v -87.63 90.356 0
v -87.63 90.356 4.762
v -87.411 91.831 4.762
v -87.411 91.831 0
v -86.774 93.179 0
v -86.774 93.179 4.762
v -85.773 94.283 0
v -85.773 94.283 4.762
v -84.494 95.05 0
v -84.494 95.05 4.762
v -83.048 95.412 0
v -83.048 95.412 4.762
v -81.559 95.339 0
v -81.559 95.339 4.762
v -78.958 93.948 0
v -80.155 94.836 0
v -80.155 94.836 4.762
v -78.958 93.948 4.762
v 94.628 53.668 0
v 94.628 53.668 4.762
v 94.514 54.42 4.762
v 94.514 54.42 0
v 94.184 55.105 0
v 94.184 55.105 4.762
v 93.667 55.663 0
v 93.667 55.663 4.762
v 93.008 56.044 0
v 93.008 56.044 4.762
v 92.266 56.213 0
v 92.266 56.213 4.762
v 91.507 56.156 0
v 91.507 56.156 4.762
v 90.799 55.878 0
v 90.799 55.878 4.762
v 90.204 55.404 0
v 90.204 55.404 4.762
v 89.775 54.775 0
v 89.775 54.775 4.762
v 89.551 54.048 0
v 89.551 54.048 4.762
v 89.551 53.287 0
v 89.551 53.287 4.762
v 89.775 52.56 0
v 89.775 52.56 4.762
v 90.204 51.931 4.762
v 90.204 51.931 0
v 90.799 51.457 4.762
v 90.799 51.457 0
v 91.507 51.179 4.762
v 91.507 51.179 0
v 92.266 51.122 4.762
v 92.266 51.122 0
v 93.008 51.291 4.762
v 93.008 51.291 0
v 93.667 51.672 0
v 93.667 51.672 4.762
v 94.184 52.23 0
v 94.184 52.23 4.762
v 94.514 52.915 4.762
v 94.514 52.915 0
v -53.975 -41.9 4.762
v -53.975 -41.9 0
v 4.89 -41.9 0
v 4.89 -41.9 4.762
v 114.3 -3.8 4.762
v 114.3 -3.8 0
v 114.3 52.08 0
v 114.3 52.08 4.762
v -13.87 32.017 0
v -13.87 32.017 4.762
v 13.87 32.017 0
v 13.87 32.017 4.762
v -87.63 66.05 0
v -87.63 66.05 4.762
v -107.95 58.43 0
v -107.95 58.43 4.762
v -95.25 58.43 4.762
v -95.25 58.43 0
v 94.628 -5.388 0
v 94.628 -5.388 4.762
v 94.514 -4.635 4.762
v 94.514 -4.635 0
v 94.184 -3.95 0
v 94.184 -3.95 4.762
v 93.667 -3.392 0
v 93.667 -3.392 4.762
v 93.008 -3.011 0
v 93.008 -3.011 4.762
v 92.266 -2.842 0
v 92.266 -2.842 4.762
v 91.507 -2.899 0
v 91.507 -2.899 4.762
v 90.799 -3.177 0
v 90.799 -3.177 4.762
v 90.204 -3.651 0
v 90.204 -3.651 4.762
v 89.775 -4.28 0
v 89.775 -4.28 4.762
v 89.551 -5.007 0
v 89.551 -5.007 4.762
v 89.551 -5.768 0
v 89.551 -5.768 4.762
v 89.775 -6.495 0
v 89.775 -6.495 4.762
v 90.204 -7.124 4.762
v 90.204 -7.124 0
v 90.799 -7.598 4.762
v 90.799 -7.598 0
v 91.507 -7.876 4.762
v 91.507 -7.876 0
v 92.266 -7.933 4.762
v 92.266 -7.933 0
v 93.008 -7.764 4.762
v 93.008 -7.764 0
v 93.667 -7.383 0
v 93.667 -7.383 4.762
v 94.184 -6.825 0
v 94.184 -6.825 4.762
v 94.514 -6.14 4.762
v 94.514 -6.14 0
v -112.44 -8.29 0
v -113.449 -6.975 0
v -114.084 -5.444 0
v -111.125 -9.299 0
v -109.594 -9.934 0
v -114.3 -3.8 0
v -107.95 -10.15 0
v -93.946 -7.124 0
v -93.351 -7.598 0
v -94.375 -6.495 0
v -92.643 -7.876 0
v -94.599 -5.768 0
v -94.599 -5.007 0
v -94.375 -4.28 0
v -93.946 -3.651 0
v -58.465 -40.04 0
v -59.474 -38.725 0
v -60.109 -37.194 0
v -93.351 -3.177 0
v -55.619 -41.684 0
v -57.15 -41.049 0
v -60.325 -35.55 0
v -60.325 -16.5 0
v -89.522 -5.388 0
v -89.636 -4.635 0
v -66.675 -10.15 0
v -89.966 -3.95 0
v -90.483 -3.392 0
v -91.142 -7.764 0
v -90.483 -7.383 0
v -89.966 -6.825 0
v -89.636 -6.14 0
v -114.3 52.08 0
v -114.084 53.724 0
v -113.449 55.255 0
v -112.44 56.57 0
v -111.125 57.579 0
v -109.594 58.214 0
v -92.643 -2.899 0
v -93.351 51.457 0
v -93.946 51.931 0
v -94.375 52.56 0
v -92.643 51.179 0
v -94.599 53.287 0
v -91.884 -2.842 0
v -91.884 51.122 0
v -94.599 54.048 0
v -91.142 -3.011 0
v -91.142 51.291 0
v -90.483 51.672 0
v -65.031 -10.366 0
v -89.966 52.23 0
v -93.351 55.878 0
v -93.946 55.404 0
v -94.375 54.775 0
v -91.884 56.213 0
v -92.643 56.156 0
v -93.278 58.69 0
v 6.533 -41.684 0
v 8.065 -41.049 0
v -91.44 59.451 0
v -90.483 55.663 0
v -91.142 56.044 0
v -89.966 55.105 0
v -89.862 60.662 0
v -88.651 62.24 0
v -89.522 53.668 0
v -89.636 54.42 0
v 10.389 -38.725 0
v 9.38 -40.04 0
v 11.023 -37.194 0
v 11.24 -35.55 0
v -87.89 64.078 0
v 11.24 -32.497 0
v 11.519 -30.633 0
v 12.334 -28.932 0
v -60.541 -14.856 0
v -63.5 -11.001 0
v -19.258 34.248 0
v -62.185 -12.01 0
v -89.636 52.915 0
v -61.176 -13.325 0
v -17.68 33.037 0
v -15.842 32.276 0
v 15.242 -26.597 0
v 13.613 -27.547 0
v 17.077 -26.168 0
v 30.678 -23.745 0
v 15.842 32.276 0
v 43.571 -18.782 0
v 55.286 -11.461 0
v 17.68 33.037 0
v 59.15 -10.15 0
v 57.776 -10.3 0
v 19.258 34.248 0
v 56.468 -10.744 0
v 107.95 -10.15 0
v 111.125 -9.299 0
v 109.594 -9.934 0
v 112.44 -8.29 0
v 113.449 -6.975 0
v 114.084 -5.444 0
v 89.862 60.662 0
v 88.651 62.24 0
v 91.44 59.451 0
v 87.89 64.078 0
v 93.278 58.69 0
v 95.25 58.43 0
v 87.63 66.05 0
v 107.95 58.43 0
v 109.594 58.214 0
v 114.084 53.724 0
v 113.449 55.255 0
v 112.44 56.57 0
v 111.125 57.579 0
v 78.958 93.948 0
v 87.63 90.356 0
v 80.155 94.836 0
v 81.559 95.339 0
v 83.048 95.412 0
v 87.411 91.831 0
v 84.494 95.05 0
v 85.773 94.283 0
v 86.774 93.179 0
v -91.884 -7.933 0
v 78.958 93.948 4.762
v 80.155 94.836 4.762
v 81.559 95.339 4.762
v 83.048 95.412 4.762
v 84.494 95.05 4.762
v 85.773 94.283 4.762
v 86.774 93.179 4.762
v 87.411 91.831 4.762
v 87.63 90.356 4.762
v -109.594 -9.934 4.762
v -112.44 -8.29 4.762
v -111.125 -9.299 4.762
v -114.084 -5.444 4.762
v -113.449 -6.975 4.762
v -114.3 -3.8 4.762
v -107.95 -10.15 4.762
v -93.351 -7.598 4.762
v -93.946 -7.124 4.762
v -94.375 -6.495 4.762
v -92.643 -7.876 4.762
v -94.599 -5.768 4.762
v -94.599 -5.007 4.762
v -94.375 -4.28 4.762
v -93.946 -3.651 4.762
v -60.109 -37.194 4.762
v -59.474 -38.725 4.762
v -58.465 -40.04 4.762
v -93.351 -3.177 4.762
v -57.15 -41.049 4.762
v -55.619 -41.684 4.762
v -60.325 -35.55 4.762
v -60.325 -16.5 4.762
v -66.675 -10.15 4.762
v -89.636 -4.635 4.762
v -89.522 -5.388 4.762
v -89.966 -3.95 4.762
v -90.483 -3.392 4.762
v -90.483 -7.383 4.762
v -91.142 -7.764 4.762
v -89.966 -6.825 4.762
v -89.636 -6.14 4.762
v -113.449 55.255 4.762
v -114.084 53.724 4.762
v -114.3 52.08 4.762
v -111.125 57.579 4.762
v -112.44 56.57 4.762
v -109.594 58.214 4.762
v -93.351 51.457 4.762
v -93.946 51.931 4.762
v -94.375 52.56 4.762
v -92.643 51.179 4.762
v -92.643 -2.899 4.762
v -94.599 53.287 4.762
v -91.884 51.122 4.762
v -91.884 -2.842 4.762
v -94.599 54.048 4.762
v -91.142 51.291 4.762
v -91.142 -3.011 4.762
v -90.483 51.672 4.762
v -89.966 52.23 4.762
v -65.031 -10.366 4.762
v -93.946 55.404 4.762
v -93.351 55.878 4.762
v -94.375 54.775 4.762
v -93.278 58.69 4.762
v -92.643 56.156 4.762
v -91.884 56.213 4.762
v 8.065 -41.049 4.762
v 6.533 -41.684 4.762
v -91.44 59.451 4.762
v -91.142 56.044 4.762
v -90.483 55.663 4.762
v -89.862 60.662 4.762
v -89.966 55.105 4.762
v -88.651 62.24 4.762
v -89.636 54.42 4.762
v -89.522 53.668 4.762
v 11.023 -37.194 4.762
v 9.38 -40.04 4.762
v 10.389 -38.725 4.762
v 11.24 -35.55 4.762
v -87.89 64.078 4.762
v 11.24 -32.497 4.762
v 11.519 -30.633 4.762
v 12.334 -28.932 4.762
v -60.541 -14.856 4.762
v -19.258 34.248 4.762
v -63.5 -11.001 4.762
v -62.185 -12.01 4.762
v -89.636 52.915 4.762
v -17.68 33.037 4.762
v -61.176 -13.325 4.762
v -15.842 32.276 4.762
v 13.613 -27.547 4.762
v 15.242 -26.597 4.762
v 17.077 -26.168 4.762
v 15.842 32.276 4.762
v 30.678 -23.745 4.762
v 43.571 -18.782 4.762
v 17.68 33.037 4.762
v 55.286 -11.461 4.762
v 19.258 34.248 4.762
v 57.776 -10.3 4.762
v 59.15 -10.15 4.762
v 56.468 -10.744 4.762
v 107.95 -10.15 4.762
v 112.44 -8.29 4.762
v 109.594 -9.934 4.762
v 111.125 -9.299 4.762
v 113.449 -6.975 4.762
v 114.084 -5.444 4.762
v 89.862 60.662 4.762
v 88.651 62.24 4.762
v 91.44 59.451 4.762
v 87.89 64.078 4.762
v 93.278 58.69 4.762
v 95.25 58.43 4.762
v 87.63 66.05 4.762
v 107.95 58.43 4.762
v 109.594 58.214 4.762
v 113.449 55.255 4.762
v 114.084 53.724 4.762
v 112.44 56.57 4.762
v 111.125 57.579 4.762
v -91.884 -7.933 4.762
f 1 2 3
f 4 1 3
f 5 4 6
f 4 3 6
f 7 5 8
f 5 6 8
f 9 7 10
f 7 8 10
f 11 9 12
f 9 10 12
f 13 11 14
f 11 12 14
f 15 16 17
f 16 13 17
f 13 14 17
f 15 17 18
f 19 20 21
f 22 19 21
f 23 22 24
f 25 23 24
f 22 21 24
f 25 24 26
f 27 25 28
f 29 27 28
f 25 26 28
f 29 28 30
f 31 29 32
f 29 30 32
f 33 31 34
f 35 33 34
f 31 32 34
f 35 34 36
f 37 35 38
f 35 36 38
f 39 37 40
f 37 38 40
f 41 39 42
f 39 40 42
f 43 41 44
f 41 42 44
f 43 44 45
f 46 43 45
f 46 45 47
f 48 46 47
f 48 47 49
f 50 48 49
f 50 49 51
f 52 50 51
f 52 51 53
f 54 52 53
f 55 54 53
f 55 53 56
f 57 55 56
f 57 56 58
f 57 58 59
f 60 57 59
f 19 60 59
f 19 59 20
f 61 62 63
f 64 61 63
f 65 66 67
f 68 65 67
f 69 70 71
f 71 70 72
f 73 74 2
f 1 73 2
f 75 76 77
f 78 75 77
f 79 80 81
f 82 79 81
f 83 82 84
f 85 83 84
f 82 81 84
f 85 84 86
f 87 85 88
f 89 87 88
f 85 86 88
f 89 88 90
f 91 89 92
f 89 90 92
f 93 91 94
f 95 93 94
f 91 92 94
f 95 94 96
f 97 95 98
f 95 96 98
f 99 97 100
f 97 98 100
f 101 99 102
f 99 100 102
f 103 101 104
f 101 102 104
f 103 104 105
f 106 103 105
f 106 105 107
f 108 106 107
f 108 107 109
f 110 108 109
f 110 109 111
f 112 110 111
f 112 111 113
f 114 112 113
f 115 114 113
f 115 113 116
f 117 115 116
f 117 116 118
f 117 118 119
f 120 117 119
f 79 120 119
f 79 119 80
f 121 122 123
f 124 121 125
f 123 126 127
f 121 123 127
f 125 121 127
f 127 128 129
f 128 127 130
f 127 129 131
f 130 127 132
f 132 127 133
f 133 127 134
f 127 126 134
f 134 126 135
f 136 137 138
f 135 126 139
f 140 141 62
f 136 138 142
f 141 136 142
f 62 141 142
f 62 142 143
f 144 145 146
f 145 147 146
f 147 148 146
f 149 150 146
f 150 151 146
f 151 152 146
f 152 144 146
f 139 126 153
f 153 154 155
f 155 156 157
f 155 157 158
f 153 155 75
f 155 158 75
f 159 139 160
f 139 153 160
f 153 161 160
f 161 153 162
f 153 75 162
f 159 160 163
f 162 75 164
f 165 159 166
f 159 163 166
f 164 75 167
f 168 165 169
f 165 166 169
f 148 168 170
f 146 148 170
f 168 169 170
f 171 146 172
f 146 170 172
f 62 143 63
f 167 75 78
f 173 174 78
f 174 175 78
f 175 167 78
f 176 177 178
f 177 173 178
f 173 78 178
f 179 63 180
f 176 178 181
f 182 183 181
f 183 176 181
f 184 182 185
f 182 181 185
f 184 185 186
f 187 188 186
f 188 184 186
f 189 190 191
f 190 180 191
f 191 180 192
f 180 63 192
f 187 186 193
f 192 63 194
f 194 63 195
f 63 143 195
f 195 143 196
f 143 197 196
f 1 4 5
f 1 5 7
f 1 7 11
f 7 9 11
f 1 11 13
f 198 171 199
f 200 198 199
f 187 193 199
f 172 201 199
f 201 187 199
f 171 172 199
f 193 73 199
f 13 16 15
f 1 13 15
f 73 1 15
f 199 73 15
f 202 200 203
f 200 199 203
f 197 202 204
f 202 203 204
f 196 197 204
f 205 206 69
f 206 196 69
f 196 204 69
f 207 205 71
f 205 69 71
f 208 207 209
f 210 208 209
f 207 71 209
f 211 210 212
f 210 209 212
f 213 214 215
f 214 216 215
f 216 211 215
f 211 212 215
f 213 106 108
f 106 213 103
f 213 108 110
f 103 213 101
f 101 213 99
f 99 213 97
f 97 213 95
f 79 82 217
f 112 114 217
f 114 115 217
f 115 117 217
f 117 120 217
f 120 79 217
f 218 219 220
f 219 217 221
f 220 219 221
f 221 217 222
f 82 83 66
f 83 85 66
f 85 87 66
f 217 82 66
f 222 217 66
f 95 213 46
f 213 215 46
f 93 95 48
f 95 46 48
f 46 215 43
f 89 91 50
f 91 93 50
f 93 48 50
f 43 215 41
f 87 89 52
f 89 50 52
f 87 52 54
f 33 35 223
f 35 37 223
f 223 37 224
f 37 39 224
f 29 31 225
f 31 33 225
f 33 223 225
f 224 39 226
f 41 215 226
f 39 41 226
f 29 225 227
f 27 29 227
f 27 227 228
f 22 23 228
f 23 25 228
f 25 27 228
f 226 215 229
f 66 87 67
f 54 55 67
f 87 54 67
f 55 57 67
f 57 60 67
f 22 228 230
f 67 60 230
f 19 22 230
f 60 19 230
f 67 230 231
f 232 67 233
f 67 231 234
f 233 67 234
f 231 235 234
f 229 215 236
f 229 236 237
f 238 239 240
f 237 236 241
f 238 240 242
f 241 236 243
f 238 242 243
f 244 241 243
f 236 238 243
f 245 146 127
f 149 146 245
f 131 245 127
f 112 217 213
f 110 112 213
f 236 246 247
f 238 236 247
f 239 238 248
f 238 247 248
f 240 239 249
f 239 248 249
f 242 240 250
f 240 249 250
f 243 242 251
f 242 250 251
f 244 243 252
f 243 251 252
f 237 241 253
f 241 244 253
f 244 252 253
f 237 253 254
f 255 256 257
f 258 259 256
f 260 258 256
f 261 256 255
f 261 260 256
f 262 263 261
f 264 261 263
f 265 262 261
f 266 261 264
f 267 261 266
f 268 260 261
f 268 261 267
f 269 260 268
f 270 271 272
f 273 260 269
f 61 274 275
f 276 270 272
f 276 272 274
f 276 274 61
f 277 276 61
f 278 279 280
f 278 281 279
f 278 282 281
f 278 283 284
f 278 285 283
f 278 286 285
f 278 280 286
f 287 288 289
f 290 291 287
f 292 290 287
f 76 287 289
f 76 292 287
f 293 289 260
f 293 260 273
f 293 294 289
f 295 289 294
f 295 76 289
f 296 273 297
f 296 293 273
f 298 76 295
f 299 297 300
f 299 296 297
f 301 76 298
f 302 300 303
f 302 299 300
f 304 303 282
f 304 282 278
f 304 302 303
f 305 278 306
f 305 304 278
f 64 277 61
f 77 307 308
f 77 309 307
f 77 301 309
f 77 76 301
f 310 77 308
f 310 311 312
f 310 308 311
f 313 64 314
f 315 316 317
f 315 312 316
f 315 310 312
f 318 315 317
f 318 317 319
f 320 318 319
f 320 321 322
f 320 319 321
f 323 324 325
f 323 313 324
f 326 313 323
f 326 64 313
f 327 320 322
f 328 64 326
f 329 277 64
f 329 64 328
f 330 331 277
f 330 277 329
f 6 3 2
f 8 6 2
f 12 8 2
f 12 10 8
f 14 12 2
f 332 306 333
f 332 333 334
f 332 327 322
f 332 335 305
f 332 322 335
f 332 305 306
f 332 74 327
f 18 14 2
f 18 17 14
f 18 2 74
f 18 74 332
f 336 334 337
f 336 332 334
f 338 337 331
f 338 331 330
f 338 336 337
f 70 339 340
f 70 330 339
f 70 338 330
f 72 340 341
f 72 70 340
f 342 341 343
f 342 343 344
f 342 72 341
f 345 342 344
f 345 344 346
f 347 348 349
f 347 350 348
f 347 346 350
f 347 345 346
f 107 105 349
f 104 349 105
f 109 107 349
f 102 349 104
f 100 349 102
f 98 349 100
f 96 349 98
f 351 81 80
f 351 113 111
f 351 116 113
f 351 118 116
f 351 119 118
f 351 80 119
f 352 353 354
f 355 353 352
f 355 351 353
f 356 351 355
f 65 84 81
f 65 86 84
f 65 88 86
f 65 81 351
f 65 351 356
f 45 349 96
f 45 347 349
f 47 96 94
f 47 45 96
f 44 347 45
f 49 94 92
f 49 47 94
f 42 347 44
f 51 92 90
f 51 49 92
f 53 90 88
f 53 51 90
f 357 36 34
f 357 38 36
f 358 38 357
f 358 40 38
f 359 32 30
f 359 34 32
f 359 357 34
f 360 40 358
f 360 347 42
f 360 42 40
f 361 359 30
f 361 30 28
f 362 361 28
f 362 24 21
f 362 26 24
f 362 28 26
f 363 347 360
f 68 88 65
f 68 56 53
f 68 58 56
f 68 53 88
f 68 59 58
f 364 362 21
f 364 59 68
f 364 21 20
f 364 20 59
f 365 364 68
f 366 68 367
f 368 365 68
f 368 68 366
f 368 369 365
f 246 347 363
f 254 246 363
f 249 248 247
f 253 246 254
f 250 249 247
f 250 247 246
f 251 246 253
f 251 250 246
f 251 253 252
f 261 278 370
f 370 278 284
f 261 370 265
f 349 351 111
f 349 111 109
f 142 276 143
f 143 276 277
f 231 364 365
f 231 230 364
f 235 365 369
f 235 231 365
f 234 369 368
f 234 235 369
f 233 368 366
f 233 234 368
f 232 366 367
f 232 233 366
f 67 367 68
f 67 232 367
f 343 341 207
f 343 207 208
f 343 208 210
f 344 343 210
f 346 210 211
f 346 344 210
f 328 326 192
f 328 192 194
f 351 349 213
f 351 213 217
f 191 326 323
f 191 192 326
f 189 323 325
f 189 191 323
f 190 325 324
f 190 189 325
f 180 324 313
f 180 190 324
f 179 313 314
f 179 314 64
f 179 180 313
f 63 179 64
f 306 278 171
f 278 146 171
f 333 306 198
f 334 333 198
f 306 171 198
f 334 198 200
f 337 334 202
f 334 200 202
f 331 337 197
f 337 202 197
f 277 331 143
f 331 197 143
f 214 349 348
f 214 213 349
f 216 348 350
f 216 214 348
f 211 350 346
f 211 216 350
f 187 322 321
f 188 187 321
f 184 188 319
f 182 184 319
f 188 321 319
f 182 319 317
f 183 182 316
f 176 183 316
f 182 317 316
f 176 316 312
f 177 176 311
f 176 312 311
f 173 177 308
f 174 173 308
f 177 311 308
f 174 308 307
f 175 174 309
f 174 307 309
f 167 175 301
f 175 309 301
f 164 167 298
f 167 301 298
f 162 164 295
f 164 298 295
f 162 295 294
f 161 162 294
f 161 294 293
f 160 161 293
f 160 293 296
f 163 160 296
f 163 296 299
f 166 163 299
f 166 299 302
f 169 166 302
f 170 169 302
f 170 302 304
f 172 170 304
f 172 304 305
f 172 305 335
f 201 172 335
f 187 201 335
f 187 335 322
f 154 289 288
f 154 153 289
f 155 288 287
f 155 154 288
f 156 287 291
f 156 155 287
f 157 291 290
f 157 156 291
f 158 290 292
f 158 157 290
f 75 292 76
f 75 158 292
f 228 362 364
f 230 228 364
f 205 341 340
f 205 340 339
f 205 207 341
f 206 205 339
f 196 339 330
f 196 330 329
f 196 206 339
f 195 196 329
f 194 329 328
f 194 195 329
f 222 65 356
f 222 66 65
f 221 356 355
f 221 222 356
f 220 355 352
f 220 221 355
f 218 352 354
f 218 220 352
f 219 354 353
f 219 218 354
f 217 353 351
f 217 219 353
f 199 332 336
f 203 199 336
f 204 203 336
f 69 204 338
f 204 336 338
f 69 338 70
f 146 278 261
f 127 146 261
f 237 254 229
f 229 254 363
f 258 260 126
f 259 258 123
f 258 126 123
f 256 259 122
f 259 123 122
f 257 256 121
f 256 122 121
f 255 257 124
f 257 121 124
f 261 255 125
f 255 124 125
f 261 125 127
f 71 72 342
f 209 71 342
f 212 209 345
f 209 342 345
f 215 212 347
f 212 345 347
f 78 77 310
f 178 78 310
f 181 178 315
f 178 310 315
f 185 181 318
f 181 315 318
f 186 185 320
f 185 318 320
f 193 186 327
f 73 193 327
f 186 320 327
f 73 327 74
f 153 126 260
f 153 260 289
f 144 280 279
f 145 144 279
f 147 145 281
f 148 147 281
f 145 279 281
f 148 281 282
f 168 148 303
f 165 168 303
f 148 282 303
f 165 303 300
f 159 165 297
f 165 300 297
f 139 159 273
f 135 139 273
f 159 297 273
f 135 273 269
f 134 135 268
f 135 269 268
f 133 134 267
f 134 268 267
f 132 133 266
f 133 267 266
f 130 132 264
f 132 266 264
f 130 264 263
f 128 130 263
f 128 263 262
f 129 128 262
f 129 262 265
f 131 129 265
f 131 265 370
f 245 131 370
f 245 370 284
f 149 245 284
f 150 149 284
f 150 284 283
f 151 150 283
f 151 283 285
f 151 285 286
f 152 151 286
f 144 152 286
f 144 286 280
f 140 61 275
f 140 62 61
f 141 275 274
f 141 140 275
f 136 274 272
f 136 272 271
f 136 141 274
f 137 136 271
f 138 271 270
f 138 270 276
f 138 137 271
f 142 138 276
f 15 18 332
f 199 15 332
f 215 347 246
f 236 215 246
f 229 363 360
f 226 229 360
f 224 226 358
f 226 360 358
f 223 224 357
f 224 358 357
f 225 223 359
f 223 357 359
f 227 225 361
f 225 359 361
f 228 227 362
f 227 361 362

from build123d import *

# Parameters (mm, degrees)
SKETCH2_W                  = 228.6
SKETCH2_H                  = 165.1
BOSS_EXTRUDE1_DEPTH        = 4.7625
F_1_2_0_5_DIAMETER_HOLE1_D = 25.4
SKETCH7_R                  = 66.675
CUT_EXTRUDE4_DEPTH         = 169.123203057
FILLET1_R                  = 6.35
CUT_EXTRUDE5_DEPTH         = 169.123203057
FILLET2_R                  = 6.35
SKETCH9_R                  = 2.5527
CUT_EXTRUDE6_DEPTH         = 149.980700263


with BuildPart() as part:
    # Sketch2 → Boss-Extrude1 (new body)
    with BuildSketch(Plane.XY):
        with Locations((0, 40.65)):
            Rectangle(SKETCH2_W, SKETCH2_H)
    extrude(amount=BOSS_EXTRUDE1_DEPTH)

    # 1/2 (0.5) Diameter Hole1 (through all)
    with Locations(Plane.XY.offset(4.7625)):
        with Locations((-38.227, 85.227), (38.227, 85.227), (11.2268, 45.984)):
            Hole(F_1_2_0_5_DIAMETER_HOLE1_D / 2)

    # Sketch7 → Cut-Extrude4 (cut, through all)
    with BuildSketch(Plane(origin=(0, 0, 0), x_dir=(-1, 0, 0), z_dir=(0, 0, -1))):
        with Locations((0, 180.35)):
            Circle(SKETCH7_R)
    extrude(amount=-CUT_EXTRUDE4_DEPTH, mode=Mode.SUBTRACT)

    # Fillet1
    fillet1_edges = [part.edges().sort_by_distance(p)[0] for p in [
        (-114.3, 123.2, 2.38125),
        (114.3, 123.2, 2.38125),
        (114.3, -41.9, 2.38125),
        (-114.3, -41.9, 2.38125),
    ]]
    fillet(fillet1_edges, radius=FILLET1_R)

    # Sketch8 → Cut-Extrude5 (cut, through all)
    with BuildSketch(Plane.XY.offset(4.7625)):
        with BuildLine():
            Line((-107.95, -41.9), (-60.325, -41.9))
            Line((-60.325, -41.9), (-60.325, -10.15))
            Line((-60.325, -10.15), (-114.3, -10.15))
            Line((-114.3, -10.15), (-114.3, -35.55))
            ThreePointArc((-114.3, -35.55), (-112.440128061, -40.040128061), (-107.95, -41.9))
        make_face()
        with BuildLine():
            Line((11.2395, -41.9), (11.2395, -26.403482524))
            ThreePointArc((11.2395, -26.403482524), (35.494289217, -22.219180967), (56.945117879, -10.15))
            Line((56.945117879, -10.15), (114.3, -10.15))
            Line((114.3, -10.15), (114.3, -35.55))
            ThreePointArc((114.3, -35.55), (112.440128061, -40.040128061), (107.95, -41.9))
            Line((107.95, -41.9), (11.2395, -41.9))
        make_face()
        with BuildLine():
            Line((-114.3, 58.43), (-95.25, 58.43))
            ThreePointArc((-95.25, 58.43), (-89.861846327, 60.661846327), (-87.63, 66.05))
            Line((-87.63, 66.05), (-87.63, 90.356249112))
            ThreePointArc((-87.63, 90.356249112), (-84.494031836, 95.049557138), (-78.957897552, 93.948351561))
            Line((-78.957897552, 93.948351561), (-19.257909794, 34.248363803))
            ThreePointArc((-19.257909794, 34.248363803), (-16.785803876, 32.596555438), (-13.869756121, 32.016517476))
            Line((-13.869756121, 32.016517476), (13.869756121, 32.016517476))
            ThreePointArc((13.869756121, 32.016517476), (16.785803876, 32.596555438), (19.257909794, 34.248363803))
            Line((19.257909794, 34.248363803), (78.957897552, 93.948351561))
            ThreePointArc((78.957897552, 93.948351561), (84.494031836, 95.049557138), (87.63, 90.356249112))
            Line((87.63, 90.356249112), (87.63, 66.05))
            ThreePointArc((87.63, 66.05), (89.861846327, 60.661846327), (95.25, 58.43))
            Line((95.25, 58.43), (114.3, 58.43))
            Line((114.3, 58.43), (114.3, 163.646139438))
            Line((114.3, 163.646139438), (-114.3, 163.646139438))
            Line((-114.3, 163.646139438), (-114.3, 58.43))
        make_face()
    extrude(amount=-CUT_EXTRUDE5_DEPTH, mode=Mode.SUBTRACT)

    # Fillet2
    fillet2_edges = [part.edges().sort_by_distance(p)[0] for p in [
        (11.2395, -41.9, 2.38125),
        (11.2395, -26.403482524, 2.38125),
        (56.945117879, -10.15, 2.38125),
        (114.3, -10.15, 2.38125),
        (-60.325, -10.15, 2.38125),
        (-60.325, -41.9, 2.38125),
        (-114.3, -10.15, 2.38125),
        (-114.3, 58.43, 2.38125),
        (114.3, 58.43, 2.38125),
    ]]
    fillet(fillet2_edges, radius=FILLET2_R)

    # Sketch9 → Cut-Extrude6 (cut, through all)
    with BuildSketch(Plane.XY.offset(4.7625)):
        with Locations((-92.075, 53.6675)):
            Circle(SKETCH9_R)
        with Locations((92.075, 53.6675)):
            Circle(SKETCH9_R)
        with Locations((92.075, -5.3875)):
            Circle(SKETCH9_R)
        with Locations((-92.075, -5.3875)):
            Circle(SKETCH9_R)
    extrude(amount=-CUT_EXTRUDE6_DEPTH, mode=Mode.SUBTRACT)


solid = part.part
